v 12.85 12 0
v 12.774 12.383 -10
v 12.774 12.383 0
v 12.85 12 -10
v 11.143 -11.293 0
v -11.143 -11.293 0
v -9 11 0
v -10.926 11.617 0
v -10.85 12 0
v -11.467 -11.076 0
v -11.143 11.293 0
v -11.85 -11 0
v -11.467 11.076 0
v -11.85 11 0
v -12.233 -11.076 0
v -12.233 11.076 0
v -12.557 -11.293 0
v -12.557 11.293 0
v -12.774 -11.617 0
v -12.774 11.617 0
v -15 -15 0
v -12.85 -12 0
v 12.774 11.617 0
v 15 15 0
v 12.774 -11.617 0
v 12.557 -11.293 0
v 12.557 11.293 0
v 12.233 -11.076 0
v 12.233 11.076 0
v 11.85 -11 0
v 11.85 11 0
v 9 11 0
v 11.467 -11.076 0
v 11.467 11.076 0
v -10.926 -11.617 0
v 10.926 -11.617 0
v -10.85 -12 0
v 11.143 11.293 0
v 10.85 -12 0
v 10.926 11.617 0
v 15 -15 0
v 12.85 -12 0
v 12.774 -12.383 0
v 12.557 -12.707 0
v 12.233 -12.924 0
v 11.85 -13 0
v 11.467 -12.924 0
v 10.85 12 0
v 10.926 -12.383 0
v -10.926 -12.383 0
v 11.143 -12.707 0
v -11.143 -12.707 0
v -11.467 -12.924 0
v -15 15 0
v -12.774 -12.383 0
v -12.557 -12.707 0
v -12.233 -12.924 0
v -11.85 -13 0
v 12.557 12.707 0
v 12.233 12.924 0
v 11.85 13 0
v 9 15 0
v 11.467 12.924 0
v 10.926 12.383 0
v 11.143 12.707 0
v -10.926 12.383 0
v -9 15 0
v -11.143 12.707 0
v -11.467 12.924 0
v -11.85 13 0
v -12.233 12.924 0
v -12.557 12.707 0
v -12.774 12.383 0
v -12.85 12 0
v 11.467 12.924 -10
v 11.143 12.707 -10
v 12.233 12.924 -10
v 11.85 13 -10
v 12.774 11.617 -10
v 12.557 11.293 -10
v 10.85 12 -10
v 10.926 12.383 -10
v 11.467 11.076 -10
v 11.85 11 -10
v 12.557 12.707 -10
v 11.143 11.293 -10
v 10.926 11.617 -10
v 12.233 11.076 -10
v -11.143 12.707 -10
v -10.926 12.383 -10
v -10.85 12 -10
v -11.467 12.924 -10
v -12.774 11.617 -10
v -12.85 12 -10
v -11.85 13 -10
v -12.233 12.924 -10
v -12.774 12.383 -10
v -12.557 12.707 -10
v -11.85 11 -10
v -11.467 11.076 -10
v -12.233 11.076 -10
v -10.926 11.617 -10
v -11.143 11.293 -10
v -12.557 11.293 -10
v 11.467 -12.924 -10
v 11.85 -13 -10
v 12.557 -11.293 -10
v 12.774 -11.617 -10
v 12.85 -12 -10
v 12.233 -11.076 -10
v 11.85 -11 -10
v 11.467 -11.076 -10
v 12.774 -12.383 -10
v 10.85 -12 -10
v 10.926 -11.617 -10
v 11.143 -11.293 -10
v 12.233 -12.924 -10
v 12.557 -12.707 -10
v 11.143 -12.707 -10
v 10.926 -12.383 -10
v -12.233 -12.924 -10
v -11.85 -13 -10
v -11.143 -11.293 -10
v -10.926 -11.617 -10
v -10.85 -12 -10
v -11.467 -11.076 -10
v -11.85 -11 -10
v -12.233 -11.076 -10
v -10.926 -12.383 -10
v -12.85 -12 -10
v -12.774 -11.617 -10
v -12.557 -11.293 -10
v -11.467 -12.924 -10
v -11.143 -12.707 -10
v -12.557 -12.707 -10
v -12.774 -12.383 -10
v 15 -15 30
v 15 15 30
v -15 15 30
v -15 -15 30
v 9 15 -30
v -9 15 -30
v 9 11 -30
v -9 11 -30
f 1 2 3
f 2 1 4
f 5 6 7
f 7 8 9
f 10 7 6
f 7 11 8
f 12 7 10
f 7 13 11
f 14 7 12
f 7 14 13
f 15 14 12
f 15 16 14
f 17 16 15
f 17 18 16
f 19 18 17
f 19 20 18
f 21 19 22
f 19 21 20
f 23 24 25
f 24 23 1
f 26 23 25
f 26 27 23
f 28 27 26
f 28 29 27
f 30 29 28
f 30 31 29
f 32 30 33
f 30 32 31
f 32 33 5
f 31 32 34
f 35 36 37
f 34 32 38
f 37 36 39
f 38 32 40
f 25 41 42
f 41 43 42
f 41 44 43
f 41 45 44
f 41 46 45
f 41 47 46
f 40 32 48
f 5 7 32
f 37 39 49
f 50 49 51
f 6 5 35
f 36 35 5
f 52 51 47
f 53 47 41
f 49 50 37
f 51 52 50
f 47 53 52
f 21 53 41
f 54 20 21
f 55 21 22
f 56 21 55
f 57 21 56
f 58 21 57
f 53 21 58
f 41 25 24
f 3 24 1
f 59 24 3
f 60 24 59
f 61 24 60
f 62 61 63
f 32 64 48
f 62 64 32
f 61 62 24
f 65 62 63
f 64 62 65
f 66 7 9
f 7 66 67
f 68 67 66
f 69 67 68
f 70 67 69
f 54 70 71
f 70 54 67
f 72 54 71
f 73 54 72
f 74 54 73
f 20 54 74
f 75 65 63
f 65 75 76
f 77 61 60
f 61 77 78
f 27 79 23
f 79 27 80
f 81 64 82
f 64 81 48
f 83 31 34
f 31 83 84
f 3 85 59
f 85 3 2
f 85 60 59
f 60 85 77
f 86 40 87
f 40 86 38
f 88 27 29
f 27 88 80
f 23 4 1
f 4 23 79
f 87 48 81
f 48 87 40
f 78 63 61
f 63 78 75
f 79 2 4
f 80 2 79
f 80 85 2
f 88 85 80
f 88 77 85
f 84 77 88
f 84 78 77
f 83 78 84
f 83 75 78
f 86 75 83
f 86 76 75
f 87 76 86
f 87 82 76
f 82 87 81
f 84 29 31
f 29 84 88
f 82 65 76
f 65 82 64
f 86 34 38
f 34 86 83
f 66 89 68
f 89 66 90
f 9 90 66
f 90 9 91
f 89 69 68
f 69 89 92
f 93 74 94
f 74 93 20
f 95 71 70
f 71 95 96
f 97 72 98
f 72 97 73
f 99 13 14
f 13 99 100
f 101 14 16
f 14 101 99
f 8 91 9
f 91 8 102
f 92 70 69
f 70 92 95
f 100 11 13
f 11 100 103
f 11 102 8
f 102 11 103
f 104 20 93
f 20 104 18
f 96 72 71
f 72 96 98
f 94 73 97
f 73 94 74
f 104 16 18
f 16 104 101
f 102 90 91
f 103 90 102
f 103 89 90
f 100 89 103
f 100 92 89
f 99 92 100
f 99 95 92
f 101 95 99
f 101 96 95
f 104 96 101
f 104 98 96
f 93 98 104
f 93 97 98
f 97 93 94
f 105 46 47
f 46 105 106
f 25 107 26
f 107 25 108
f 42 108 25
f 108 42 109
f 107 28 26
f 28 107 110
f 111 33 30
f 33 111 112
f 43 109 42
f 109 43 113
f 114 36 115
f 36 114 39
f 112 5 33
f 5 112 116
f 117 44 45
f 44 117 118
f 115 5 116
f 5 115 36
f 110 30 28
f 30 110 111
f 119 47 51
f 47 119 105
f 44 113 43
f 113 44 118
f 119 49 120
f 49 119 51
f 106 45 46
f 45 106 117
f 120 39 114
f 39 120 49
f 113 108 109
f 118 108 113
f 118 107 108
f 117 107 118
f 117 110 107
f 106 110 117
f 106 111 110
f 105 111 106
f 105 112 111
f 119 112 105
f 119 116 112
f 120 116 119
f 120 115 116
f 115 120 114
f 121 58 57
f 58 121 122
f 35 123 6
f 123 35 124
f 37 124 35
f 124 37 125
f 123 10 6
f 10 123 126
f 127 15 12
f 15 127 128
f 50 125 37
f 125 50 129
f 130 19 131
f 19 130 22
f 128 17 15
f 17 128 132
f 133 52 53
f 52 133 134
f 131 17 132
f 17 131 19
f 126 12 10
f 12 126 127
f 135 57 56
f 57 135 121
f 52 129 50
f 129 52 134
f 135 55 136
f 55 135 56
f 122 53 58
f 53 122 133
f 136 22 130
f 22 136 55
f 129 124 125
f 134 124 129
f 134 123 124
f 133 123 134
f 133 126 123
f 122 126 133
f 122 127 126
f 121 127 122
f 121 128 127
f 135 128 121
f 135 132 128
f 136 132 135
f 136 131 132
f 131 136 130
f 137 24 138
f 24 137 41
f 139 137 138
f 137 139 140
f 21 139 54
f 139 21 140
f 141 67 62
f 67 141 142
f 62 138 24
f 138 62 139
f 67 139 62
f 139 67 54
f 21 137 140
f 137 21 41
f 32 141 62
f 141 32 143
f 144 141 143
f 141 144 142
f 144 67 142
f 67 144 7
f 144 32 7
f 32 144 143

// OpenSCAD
//SSD13

module SSD13(insertD = 2)
{
    holeDepth = 10;
    faceDepth = 30;
    cableDepth = 30;
    
    color("red")
    {
        
        // holes 
        translate([23.7/2,24/2,-holeDepth])
            cylinder(h=holeDepth, d=insertD, $fn=16);
        translate([-23.7/2,24/2,-holeDepth])
            cylinder(h=holeDepth, d=insertD, $fn=16);
        translate([23.7/2,-24/2,-holeDepth])
            cylinder(h=holeDepth, d=insertD, $fn=16);
        translate([-23.7/2,-24/2,-holeDepth])
            cylinder(h=holeDepth, d=insertD, $fn=16);
    }
    color ("grey")
    {
        translate([0,0,faceDepth/2])
            cube([30, 30, faceDepth], center = true);
    }
    color ("pink")
    {
        translate([0,30/2-2,-cableDepth/2])
            cube([18, 4, cableDepth], center = true);
    }
    
    
    
}
SSD13();
